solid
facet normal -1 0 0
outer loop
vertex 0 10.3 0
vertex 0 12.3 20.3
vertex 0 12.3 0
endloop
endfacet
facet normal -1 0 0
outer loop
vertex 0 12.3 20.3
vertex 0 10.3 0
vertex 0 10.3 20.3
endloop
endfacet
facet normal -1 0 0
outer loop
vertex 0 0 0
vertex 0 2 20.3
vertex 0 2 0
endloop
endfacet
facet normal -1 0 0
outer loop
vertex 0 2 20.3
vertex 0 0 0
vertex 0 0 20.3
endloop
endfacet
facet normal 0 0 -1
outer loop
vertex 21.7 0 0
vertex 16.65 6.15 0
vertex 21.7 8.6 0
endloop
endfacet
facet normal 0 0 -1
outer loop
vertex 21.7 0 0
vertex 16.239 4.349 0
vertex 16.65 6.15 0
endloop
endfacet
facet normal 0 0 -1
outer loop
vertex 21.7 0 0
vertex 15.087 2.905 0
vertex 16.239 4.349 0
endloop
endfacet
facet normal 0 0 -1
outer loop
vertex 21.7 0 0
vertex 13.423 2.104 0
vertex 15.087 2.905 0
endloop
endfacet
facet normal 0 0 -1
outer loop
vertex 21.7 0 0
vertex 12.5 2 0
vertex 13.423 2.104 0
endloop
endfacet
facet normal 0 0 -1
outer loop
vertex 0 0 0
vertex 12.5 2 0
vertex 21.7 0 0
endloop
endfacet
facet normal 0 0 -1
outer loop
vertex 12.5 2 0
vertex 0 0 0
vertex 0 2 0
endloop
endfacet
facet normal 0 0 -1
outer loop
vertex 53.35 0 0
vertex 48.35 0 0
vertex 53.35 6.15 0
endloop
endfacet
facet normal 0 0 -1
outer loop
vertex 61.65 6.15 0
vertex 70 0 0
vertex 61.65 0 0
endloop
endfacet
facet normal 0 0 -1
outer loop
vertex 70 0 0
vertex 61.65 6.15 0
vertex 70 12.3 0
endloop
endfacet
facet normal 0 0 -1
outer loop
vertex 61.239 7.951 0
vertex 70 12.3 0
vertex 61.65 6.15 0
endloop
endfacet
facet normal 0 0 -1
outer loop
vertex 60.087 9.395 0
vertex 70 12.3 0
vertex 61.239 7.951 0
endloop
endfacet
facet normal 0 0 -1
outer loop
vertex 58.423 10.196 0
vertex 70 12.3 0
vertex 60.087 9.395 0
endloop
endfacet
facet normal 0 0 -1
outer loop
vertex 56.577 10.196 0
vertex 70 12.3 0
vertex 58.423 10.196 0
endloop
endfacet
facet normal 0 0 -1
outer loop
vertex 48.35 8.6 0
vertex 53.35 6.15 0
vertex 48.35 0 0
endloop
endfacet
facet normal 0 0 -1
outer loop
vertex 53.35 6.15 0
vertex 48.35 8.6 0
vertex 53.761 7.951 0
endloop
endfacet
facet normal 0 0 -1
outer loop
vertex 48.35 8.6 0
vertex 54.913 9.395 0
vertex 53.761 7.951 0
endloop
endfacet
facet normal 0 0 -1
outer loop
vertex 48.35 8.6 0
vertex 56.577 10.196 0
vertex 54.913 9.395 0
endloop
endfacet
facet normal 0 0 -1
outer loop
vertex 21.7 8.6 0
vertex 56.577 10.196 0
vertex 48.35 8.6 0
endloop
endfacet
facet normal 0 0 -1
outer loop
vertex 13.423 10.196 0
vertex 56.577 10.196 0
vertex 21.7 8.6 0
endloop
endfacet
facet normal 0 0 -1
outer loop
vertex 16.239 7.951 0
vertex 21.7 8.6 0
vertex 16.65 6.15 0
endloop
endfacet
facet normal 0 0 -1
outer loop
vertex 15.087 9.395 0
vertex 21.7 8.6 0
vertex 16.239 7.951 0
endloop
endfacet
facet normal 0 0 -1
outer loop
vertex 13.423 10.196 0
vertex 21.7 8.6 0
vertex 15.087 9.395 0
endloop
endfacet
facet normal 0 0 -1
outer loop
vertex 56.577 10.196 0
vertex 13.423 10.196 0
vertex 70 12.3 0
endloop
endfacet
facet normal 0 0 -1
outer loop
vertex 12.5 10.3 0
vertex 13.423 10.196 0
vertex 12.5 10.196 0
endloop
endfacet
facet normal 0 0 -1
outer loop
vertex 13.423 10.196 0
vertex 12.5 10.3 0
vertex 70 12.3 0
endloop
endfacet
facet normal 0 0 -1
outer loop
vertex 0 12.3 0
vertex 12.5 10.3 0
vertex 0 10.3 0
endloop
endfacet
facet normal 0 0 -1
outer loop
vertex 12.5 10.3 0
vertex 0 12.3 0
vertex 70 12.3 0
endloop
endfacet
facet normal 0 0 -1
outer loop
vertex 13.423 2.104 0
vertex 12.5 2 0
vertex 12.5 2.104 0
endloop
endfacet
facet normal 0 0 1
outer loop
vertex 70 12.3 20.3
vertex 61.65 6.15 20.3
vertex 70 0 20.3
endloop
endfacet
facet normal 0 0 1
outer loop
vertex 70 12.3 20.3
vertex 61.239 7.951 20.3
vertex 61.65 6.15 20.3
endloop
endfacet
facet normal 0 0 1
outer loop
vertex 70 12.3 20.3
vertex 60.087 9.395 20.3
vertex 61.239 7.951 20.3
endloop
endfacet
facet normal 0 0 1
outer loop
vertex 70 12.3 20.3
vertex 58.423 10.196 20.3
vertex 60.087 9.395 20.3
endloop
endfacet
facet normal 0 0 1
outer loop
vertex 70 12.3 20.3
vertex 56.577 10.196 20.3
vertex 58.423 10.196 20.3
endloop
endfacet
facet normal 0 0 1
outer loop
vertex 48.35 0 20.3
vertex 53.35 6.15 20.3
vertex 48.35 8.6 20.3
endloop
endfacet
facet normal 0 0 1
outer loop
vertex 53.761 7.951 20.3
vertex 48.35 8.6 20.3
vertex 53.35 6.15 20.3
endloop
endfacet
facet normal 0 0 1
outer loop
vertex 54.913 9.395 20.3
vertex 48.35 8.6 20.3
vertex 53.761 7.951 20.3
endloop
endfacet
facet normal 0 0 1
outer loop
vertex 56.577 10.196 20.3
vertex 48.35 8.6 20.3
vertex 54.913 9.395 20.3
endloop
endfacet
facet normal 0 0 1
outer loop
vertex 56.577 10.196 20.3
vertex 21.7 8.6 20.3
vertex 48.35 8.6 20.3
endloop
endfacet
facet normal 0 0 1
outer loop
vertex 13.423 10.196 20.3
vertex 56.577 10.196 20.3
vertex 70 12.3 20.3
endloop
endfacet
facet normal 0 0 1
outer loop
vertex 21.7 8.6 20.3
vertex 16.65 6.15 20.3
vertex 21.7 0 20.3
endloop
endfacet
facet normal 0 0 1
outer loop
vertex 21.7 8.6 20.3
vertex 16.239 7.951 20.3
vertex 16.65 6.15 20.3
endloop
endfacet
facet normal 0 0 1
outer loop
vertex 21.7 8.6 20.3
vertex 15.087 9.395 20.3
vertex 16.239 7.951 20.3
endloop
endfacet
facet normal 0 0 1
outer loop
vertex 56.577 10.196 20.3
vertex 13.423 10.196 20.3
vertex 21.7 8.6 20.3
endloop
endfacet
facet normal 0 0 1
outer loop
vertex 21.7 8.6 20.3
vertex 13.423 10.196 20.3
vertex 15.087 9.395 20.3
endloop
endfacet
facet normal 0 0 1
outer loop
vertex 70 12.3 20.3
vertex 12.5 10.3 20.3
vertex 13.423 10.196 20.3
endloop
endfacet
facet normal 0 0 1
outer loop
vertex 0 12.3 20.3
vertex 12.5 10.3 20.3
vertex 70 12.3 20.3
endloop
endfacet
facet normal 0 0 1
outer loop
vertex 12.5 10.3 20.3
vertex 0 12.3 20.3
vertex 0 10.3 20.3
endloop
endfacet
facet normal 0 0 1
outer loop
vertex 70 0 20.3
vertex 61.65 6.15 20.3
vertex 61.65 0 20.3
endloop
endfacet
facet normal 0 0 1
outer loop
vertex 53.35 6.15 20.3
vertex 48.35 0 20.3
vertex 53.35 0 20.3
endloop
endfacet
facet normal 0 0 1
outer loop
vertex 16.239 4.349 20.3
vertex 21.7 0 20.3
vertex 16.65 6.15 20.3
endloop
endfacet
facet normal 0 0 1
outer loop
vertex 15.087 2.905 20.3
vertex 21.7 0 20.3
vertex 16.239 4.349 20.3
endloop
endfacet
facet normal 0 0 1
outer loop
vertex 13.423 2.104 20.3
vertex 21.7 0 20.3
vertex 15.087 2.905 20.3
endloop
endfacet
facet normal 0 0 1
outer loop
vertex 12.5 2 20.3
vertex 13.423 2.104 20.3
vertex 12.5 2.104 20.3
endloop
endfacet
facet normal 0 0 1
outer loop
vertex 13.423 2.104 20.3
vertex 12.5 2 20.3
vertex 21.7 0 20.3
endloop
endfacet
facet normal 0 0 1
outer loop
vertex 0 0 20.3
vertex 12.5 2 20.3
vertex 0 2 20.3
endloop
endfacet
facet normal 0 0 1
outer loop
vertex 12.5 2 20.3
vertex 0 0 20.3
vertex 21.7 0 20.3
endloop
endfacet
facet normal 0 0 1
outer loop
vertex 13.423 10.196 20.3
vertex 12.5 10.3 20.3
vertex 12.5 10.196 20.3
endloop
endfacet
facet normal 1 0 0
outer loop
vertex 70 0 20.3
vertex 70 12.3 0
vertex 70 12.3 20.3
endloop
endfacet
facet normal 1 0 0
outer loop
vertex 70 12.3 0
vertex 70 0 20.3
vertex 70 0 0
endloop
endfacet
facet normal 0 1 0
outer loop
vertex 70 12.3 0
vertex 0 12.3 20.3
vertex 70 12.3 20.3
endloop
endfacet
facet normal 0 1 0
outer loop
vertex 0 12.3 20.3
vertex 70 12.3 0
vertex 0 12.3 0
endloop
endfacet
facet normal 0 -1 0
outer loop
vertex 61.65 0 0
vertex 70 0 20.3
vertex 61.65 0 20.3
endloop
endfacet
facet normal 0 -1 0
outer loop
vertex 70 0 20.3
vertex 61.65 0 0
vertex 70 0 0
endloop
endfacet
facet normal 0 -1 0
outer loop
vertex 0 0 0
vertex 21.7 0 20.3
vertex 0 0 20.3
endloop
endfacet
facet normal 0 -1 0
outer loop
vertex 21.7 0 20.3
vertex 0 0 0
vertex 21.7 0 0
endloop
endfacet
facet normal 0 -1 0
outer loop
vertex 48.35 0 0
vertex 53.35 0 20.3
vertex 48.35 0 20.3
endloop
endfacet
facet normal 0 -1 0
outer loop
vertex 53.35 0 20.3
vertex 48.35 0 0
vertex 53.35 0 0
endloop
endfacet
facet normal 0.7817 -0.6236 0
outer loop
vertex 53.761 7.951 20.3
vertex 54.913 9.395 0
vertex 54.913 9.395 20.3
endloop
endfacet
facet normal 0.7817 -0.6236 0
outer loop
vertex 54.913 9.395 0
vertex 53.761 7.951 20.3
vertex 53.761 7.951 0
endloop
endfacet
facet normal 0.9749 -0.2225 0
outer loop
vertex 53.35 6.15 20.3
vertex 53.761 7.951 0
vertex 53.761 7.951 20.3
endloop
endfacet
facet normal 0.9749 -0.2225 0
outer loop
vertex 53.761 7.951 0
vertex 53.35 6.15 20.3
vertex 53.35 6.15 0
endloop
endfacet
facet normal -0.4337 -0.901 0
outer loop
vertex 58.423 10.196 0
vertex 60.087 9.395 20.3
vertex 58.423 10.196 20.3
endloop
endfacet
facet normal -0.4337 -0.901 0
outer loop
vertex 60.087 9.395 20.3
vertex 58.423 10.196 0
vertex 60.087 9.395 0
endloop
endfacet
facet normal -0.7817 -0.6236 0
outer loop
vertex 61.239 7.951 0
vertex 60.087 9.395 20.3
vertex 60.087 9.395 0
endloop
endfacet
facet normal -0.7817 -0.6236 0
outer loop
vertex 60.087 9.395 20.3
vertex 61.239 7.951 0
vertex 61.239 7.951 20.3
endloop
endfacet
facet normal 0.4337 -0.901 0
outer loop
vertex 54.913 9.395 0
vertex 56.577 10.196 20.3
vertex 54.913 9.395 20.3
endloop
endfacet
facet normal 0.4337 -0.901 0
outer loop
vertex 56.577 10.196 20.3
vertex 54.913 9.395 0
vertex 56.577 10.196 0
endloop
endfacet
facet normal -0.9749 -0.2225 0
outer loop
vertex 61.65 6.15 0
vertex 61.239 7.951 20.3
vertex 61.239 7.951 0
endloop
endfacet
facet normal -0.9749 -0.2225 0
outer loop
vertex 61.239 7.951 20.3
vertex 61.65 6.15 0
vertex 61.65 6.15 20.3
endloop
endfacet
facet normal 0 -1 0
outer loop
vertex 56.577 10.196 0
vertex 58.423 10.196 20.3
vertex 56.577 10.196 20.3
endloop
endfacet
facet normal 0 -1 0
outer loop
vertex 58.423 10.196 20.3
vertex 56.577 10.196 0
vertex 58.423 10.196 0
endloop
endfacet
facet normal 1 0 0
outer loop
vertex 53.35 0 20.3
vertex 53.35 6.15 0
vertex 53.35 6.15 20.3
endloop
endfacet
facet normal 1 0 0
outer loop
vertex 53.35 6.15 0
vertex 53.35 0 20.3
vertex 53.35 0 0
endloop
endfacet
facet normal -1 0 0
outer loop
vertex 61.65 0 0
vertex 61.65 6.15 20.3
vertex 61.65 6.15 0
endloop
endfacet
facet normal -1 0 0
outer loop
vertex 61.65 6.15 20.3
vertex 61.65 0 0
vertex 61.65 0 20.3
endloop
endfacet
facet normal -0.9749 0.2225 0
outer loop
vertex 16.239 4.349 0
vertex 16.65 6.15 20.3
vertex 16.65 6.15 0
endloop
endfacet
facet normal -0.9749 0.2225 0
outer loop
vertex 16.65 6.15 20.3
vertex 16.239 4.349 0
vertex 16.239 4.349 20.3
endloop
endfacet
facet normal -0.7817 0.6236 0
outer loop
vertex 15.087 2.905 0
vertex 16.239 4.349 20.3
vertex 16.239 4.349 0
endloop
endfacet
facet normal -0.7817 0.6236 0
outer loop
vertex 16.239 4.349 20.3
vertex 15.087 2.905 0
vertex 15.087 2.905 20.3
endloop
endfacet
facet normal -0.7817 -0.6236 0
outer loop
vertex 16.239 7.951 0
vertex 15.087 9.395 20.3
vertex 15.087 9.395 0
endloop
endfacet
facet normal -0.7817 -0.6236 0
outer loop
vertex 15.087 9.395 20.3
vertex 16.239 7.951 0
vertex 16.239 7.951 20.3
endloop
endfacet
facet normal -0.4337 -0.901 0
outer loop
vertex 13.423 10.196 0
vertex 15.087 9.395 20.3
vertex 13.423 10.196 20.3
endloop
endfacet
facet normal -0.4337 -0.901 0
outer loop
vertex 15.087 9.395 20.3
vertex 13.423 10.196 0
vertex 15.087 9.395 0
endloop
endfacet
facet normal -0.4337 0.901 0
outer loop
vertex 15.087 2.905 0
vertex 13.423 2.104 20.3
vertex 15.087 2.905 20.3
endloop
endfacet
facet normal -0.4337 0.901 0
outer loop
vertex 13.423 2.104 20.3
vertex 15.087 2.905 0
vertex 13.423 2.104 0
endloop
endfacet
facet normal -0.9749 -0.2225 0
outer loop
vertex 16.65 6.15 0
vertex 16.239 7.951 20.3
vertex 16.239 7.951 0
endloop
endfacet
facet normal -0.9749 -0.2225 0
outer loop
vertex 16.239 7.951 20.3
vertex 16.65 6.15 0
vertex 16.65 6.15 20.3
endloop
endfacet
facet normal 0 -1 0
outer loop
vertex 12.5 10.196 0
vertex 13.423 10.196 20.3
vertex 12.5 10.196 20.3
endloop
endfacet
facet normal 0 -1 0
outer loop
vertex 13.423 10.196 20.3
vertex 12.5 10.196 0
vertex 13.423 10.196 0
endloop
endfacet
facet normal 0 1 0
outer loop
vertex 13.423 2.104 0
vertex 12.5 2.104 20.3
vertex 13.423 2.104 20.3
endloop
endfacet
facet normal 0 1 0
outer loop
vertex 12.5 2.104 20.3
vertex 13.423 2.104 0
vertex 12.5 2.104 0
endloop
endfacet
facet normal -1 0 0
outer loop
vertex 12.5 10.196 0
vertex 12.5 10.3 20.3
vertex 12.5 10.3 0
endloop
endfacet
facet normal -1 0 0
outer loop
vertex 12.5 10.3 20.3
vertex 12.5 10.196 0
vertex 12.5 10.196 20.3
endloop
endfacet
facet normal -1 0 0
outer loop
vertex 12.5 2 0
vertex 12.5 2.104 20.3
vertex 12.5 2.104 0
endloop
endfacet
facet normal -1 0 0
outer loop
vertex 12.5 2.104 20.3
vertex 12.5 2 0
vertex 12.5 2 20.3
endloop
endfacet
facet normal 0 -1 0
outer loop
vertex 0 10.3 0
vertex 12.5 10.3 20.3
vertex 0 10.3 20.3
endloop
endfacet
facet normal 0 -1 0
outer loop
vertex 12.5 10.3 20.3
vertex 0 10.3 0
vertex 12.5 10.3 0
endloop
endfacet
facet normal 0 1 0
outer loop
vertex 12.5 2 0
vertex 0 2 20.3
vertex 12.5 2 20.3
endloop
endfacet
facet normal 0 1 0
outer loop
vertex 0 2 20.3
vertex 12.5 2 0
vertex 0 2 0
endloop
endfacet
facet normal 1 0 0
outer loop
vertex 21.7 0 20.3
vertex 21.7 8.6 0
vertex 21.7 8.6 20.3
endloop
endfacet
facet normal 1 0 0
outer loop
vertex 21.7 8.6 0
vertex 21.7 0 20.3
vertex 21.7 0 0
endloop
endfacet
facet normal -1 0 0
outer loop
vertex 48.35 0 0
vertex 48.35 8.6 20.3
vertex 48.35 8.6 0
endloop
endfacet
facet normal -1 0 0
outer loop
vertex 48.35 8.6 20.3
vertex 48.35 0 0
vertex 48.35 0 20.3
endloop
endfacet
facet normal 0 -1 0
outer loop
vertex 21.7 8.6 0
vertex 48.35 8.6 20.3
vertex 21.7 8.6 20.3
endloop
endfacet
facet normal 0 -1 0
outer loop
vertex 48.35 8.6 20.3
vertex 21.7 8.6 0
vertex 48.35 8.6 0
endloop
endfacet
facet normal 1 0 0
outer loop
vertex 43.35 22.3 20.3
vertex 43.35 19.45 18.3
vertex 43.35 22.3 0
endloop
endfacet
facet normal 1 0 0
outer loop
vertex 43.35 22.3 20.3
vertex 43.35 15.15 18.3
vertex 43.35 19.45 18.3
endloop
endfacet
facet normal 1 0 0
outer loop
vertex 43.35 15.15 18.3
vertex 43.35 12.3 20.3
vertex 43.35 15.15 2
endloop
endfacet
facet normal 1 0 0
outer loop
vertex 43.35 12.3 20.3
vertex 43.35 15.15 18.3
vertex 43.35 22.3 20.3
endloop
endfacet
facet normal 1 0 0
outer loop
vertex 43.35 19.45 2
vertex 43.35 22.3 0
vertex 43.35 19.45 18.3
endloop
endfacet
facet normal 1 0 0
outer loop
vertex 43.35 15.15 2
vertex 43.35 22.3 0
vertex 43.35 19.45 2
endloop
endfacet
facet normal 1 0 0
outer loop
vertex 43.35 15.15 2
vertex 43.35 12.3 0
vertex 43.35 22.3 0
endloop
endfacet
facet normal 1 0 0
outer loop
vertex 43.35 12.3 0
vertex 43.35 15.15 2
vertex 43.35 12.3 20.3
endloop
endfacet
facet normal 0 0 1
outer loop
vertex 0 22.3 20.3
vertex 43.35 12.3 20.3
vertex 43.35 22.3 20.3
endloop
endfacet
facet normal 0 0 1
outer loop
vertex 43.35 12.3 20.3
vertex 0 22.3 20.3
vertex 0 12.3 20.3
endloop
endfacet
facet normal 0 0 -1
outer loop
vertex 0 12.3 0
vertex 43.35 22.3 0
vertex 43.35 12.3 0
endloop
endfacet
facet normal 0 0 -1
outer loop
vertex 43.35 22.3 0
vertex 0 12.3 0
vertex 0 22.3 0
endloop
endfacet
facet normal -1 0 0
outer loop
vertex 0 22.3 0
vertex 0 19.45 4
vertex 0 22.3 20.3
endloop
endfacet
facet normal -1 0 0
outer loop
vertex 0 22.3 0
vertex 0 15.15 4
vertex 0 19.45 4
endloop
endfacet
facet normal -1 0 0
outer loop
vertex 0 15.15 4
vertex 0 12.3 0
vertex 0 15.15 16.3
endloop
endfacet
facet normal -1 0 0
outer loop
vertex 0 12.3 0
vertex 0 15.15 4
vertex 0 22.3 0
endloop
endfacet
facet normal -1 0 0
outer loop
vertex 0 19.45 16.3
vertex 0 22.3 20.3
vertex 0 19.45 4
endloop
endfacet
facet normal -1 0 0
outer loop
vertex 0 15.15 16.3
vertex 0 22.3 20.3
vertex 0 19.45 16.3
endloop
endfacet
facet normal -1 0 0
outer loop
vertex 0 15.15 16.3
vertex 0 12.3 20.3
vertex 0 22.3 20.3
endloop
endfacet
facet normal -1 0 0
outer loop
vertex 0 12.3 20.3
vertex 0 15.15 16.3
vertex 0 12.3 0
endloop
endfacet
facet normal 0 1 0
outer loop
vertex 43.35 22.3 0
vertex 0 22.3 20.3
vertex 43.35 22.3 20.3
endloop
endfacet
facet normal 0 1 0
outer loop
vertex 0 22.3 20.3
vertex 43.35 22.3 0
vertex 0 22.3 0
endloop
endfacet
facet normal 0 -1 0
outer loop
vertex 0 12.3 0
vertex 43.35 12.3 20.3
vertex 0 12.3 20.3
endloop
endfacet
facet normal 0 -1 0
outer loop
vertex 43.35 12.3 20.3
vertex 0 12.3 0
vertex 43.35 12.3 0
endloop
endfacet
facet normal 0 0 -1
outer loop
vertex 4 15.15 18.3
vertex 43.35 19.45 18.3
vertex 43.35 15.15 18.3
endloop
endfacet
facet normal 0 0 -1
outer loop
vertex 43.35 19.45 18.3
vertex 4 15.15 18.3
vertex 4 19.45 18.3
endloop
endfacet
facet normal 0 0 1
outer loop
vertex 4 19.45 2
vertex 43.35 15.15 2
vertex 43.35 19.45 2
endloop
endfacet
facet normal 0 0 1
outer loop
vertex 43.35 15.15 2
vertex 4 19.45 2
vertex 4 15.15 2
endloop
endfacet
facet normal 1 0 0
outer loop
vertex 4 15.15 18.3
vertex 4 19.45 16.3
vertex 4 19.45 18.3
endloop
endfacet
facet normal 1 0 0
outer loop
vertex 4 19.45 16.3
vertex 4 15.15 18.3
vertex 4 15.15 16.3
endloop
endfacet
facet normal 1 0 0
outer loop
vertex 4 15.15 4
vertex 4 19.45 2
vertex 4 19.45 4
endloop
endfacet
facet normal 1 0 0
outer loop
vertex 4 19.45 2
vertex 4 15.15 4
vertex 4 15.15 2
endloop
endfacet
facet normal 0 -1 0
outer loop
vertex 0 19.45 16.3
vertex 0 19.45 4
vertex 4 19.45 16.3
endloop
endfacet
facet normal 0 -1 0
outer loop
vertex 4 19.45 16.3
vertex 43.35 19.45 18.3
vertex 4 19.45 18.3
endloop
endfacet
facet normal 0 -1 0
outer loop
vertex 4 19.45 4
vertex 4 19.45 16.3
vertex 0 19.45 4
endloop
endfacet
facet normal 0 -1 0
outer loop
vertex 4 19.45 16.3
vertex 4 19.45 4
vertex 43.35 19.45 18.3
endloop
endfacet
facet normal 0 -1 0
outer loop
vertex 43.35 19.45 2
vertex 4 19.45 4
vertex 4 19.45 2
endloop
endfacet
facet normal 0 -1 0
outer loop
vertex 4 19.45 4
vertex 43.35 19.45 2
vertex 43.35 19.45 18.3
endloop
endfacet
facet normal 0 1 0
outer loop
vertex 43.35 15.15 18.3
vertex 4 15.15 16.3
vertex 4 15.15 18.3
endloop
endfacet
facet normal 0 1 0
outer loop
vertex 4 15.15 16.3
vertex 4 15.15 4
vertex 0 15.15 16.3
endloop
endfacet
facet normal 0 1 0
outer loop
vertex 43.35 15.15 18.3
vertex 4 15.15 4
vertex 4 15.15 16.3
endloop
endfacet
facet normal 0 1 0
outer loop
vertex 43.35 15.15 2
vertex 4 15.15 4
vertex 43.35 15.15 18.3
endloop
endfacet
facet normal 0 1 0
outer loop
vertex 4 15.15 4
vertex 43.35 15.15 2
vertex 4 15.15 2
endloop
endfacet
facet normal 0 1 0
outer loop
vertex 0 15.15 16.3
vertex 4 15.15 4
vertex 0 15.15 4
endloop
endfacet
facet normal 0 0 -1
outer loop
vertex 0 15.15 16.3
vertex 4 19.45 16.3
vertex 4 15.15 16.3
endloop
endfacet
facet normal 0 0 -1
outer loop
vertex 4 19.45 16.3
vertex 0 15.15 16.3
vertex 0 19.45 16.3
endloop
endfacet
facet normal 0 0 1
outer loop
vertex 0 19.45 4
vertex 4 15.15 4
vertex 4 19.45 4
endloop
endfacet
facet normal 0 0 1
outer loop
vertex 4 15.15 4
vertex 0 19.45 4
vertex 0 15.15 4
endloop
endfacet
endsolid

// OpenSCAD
seperation = 45; // Rod seperation
diameter = 8.3;  // Rod diameter
height = 70; // Height of object
caliper_width = 16.3;  // Width of caliper shaft
tool_width = caliper_width+4;
caliper_thickness = 4.3; // Thickness of caliper shaft
minimum_belt_distance = 5;
mount_width=4;
center=height/2;
rotate_body=1; // Rotate the body for easier tool removal

module body() {
	difference() {
		cube([height,diameter+mount_width,tool_width]);
		translate([center-seperation/2, diameter/2+mount_width/2, 0])
			cylinder(h=tool_width, r=diameter/2);
		translate([center-seperation/2-diameter/2, 0 ,0])
		cube([diameter,diameter/2+mount_width/2,tool_width]);

		translate([center+seperation/2, diameter/2+mount_width/2, 0])
			cylinder(h=tool_width, r=diameter/2);
		translate([center+seperation/2,mount_width/2,0])
			cube([height-center+seperation/2,diameter,tool_width]);

		translate([center-seperation/2+diameter/2+minimum_belt_distance,0,0])
			cube([seperation/2+diameter/2,diameter+0.3,tool_width]);
	}
}

module caliper_mount() {
	difference() {
		cube([height-center+seperation/2-diameter/2-10,10,tool_width]);
		translate([4,5-caliper_thickness/2,2])
			cube([height-center+seperation/2-diameter/2-10-4,caliper_thickness,caliper_width]);
		translate([0,5-caliper_thickness/2,4])
			cube([4,caliper_thickness,caliper_width-4]);
	}
}

difference() {
	union() {
		if (rotate_body == 1) {
			translate([height,0,tool_width])
				rotate([0,180,0])
					body();
		} else {
		body();
		}
		translate([0,mount_width+diameter,0])
			caliper_mount();
	}
}
